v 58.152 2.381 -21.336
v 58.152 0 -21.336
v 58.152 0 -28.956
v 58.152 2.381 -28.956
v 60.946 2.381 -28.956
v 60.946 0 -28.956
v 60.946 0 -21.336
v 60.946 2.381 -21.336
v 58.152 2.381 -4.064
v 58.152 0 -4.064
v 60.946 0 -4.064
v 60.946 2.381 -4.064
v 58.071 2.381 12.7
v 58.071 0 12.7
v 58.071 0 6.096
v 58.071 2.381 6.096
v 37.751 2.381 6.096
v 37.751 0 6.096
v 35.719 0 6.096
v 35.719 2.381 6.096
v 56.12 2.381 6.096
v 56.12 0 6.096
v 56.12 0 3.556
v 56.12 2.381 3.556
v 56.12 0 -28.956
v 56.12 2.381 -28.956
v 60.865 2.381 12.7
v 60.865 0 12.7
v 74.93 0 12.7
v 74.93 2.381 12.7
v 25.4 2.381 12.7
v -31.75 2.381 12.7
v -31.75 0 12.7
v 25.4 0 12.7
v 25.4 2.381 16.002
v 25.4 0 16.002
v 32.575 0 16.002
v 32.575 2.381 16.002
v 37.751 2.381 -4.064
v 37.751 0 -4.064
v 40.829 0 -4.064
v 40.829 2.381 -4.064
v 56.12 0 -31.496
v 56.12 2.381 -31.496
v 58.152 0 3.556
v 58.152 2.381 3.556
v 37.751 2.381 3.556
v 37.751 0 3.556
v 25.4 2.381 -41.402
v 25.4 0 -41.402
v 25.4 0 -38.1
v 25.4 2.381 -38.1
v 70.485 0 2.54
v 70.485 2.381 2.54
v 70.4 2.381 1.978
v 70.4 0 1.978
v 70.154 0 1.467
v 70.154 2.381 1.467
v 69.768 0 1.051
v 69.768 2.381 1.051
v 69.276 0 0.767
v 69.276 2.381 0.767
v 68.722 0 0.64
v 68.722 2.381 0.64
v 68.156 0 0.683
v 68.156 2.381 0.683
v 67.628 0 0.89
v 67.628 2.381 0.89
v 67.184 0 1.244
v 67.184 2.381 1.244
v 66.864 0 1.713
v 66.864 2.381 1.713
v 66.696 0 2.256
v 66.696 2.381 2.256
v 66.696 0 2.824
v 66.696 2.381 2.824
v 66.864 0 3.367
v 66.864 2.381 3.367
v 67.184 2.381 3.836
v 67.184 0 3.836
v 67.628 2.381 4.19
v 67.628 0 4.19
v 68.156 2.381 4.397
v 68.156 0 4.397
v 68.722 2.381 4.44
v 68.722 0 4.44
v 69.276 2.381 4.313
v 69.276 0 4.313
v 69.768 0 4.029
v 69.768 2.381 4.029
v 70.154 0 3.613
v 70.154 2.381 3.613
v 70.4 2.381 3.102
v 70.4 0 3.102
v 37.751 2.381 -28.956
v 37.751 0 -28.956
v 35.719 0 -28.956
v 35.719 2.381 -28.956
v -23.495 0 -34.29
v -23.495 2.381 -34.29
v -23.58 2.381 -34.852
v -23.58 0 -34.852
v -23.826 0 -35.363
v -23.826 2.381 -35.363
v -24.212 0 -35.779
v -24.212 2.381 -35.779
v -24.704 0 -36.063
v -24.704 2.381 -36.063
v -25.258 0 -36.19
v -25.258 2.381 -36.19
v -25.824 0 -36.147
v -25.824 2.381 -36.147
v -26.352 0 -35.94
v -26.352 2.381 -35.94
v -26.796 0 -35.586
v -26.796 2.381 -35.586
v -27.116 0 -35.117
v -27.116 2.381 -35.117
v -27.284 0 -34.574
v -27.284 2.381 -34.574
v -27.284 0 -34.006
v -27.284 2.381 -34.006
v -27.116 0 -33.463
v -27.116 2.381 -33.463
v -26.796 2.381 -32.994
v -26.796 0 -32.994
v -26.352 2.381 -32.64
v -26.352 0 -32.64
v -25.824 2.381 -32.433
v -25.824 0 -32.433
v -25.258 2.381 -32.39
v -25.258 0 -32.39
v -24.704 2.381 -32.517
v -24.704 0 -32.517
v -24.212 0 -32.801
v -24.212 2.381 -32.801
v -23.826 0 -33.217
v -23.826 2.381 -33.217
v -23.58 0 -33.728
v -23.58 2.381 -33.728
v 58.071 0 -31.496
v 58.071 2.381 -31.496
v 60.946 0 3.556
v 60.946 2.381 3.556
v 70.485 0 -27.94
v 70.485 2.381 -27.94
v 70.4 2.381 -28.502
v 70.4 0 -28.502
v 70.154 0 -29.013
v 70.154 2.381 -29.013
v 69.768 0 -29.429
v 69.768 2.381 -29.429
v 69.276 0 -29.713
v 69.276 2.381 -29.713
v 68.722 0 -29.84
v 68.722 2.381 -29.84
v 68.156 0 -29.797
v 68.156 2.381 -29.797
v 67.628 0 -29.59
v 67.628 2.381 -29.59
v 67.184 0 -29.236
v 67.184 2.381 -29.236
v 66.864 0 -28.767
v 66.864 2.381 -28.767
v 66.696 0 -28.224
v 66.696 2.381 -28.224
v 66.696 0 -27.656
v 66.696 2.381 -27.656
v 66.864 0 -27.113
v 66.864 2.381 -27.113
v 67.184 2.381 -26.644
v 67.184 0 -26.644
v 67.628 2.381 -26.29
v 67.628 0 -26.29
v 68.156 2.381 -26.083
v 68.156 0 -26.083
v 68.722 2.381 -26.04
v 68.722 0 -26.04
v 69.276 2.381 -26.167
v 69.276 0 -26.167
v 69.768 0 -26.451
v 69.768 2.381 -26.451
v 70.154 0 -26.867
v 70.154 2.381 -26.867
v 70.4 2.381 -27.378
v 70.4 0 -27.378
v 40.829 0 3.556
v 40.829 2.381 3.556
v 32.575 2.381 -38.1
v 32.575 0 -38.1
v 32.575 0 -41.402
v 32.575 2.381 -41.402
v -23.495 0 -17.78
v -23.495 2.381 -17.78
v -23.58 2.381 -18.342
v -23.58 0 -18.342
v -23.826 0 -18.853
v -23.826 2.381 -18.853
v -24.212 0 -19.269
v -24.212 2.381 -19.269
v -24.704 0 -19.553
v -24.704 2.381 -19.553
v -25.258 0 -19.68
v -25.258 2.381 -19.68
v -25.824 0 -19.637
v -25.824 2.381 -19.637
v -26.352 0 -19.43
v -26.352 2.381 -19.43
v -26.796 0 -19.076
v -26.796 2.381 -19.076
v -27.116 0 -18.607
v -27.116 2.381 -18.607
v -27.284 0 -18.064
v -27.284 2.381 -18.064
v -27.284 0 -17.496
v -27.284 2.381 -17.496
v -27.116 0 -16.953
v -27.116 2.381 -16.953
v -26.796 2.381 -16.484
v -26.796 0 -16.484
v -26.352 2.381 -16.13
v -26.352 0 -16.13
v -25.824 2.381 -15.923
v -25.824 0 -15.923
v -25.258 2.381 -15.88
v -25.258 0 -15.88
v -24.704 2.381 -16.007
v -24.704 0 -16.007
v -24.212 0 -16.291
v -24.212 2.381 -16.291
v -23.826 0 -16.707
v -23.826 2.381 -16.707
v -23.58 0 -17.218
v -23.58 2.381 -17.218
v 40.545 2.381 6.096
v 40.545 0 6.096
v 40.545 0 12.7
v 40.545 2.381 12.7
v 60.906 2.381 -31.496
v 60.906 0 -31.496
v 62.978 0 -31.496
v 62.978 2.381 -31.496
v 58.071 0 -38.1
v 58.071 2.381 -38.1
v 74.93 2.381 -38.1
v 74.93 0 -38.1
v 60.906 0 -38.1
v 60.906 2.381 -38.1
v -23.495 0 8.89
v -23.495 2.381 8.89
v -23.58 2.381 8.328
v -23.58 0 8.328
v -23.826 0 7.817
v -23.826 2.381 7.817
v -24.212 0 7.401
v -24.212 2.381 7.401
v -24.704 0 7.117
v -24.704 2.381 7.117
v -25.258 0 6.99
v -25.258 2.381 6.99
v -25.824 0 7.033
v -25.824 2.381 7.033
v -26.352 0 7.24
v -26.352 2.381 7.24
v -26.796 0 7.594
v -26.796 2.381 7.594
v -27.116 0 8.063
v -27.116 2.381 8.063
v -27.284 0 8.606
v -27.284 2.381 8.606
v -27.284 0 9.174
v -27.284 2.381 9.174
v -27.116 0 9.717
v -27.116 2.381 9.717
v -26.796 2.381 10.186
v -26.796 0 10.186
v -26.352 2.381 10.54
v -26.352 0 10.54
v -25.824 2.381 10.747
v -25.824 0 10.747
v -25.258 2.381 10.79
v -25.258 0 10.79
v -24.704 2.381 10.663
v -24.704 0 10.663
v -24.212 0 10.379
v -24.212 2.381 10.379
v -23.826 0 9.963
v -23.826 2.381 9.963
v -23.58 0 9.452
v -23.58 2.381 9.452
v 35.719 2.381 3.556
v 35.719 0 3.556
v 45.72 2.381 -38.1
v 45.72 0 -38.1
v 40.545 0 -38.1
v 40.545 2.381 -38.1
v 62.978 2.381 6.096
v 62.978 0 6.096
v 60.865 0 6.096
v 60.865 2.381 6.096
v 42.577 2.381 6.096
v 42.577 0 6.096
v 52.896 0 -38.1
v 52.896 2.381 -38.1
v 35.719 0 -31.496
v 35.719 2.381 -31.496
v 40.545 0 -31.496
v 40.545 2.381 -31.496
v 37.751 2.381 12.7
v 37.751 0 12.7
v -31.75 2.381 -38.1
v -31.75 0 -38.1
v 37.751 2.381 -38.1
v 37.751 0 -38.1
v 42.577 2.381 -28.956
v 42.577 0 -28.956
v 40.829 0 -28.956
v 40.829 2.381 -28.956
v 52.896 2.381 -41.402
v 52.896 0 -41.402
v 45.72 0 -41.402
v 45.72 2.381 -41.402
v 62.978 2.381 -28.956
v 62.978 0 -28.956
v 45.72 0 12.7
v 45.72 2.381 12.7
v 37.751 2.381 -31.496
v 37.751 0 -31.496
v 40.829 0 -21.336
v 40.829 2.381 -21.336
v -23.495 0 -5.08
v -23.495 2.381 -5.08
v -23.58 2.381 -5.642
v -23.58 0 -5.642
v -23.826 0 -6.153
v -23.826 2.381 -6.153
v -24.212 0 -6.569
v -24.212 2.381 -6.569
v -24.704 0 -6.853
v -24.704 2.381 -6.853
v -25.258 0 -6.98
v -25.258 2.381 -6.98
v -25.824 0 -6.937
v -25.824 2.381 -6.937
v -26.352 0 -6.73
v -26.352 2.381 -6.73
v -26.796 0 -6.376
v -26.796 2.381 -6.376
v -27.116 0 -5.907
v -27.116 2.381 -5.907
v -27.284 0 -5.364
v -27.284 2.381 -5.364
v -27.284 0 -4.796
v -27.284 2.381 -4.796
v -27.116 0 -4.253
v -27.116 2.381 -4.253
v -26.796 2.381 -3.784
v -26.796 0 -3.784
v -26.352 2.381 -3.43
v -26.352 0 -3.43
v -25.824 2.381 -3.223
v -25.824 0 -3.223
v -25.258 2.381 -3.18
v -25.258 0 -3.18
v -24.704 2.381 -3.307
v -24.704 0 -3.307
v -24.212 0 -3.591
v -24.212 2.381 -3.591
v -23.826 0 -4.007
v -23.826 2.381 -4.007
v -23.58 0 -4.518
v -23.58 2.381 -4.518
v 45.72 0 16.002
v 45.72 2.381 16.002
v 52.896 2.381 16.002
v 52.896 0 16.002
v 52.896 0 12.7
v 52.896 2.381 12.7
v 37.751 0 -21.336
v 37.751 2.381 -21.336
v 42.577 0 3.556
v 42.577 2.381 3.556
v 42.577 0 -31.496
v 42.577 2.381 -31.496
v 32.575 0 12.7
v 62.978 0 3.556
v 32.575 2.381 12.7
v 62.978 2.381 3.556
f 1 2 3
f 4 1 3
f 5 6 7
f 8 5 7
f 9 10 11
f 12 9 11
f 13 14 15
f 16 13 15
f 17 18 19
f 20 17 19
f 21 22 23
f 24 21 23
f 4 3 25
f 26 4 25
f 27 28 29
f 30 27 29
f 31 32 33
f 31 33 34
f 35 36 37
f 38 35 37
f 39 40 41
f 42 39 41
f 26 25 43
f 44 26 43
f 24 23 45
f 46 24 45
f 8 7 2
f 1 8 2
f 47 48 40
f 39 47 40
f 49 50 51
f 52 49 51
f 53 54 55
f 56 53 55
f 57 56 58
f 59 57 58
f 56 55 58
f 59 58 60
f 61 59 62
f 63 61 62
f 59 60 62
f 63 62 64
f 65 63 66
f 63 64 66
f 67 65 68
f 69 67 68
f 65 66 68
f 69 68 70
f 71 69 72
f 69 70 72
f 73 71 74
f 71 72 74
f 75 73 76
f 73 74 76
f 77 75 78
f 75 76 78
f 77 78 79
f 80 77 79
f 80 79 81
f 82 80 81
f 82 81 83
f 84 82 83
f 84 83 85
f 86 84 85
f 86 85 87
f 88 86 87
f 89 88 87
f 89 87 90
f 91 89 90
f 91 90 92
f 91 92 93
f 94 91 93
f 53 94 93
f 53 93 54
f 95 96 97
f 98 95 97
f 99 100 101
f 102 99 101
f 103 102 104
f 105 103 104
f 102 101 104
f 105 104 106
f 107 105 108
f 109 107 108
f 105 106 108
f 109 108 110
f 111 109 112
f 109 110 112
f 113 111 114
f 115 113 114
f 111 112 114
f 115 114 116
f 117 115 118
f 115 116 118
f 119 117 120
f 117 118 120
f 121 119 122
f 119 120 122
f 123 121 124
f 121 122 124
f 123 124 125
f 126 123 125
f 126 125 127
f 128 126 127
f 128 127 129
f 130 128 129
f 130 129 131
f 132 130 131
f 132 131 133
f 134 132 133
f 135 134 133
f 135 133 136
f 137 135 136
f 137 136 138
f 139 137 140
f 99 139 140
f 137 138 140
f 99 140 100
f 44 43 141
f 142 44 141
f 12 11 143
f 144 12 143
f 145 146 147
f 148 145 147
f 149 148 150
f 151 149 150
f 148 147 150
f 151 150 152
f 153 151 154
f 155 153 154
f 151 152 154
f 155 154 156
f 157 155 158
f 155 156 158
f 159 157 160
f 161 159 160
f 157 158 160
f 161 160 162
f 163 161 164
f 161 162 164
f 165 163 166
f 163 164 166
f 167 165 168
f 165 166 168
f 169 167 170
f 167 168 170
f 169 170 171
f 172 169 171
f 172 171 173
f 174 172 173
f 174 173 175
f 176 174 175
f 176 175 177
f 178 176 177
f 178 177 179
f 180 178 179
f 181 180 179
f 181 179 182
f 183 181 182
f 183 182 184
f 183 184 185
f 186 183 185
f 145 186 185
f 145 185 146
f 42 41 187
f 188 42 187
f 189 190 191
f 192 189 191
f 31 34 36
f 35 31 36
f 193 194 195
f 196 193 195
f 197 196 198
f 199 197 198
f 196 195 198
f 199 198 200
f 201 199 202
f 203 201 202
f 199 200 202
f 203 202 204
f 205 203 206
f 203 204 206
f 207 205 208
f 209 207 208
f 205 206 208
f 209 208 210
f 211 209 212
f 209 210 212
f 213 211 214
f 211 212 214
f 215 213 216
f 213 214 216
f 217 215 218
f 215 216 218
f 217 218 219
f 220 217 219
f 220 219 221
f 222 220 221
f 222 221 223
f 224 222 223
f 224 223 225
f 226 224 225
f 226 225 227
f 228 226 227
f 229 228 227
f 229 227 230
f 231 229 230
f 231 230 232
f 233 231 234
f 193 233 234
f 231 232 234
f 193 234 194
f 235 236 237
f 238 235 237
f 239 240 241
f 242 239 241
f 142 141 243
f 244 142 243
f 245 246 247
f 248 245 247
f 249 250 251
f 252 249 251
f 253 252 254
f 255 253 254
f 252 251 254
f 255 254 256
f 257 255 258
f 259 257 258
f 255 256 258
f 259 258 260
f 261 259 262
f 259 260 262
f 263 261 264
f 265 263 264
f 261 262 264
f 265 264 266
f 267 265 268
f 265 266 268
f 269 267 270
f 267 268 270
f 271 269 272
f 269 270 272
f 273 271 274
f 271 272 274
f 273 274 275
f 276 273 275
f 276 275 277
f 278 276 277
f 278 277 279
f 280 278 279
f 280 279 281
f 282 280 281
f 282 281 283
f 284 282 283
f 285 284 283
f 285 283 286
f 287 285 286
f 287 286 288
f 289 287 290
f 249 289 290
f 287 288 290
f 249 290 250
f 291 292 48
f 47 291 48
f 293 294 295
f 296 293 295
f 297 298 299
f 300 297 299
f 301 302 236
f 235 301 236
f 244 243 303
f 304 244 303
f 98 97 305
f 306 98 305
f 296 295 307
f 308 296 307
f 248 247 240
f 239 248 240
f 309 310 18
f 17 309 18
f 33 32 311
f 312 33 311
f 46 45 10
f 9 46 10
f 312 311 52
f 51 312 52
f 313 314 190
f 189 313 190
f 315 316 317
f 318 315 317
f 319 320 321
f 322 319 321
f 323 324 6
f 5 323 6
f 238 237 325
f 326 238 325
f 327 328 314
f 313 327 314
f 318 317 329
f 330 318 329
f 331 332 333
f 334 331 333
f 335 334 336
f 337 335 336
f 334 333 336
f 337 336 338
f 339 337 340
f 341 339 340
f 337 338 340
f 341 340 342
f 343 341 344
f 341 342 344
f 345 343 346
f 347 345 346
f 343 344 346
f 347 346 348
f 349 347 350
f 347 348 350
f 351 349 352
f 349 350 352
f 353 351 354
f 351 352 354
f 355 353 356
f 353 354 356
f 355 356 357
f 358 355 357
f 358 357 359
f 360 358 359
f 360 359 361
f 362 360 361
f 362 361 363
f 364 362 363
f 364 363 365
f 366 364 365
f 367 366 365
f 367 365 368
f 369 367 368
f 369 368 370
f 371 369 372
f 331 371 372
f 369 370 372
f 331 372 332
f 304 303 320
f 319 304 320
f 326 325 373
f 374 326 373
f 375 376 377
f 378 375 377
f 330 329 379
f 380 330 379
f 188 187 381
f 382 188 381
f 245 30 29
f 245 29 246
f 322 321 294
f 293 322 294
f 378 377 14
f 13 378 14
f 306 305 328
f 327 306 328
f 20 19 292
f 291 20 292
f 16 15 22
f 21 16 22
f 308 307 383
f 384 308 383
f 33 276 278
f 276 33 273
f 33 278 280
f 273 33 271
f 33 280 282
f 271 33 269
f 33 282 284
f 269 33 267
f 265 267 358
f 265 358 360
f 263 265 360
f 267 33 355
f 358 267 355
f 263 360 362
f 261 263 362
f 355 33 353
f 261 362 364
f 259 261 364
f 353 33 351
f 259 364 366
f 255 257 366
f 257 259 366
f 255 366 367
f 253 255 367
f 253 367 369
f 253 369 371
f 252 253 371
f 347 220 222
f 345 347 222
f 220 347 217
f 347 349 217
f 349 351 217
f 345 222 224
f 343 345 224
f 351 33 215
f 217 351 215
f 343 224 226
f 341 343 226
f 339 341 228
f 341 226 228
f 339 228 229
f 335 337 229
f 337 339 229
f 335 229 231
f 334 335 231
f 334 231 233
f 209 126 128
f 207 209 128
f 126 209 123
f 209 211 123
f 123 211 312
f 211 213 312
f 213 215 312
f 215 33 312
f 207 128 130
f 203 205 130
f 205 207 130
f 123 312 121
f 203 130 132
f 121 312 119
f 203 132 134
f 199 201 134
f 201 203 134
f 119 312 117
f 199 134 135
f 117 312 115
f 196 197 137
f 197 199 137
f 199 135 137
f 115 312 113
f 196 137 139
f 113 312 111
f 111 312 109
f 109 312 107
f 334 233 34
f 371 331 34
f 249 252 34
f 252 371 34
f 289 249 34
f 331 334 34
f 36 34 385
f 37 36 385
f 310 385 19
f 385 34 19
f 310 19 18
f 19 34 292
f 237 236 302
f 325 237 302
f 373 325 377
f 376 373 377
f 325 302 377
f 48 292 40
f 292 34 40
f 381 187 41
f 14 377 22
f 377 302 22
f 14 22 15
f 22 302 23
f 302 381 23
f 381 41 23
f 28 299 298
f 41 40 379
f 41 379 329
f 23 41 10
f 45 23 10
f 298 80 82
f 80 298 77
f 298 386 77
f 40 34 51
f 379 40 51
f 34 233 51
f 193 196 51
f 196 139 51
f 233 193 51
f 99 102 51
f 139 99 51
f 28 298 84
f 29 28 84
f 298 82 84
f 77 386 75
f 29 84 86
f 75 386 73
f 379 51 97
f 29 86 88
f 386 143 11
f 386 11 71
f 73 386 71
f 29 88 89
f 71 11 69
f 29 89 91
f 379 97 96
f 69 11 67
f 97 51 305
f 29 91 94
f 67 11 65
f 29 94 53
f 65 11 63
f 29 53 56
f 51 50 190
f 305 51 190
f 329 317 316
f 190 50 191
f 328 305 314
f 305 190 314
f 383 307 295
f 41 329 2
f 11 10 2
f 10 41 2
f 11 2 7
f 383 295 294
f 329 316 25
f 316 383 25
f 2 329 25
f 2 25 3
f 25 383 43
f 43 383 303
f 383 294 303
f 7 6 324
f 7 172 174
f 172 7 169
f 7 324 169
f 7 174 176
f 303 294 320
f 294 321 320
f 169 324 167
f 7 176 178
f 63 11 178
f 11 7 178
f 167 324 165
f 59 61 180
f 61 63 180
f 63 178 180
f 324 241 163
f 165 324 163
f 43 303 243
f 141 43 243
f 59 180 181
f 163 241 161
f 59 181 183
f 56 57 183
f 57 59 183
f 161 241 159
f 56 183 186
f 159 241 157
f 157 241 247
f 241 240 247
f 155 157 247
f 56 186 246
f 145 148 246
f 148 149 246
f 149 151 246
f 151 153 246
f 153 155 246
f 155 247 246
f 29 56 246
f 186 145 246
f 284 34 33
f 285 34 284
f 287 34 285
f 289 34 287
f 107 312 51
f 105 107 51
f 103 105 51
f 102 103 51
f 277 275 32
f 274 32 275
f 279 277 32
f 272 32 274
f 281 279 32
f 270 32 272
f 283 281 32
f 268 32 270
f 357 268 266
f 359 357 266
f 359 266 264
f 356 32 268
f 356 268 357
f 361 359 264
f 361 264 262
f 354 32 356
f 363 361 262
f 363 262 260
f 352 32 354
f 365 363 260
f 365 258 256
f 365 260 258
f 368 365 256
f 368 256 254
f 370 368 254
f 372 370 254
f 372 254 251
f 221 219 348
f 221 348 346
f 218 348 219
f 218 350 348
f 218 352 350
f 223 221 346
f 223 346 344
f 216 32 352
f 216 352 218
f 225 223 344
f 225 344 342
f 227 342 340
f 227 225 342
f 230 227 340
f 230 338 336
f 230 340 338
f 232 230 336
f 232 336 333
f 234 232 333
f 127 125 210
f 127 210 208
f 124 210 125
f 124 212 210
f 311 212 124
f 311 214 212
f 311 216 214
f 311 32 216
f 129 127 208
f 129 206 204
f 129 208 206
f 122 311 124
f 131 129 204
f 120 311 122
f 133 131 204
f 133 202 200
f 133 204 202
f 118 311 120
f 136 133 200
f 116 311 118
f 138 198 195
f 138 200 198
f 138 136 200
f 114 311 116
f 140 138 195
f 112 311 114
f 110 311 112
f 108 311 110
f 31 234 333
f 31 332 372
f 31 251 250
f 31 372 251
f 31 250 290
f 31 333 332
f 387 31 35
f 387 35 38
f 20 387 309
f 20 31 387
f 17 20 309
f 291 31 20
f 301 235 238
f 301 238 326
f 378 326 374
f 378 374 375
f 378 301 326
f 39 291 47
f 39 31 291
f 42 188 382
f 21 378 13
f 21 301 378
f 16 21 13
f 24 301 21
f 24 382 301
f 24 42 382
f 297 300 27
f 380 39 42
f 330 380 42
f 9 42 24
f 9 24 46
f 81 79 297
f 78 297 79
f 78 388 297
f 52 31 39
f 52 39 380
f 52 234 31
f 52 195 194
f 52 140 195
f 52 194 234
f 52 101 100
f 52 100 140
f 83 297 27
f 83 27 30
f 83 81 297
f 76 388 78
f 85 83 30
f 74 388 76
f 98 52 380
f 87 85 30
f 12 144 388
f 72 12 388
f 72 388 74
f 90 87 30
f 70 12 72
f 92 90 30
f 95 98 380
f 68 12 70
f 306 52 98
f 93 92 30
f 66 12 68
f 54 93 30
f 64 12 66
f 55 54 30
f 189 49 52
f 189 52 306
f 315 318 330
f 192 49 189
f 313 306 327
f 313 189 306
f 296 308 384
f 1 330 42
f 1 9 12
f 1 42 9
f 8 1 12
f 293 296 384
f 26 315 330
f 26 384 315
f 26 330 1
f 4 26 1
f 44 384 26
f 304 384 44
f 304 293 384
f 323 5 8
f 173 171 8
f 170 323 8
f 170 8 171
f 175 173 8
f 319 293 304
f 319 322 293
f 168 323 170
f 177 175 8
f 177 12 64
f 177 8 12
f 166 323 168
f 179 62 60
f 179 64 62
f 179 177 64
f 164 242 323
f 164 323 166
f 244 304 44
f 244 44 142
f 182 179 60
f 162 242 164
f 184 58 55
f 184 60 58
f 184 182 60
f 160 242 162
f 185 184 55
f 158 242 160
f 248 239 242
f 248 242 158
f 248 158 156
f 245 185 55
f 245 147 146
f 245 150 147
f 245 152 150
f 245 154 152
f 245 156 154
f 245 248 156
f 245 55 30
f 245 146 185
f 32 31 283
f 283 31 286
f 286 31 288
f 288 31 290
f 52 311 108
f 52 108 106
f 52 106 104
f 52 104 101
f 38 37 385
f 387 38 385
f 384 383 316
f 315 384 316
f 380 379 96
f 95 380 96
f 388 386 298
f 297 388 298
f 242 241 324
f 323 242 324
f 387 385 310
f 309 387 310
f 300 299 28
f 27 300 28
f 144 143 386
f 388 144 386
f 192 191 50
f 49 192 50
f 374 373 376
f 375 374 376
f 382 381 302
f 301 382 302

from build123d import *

# Parameters (mm, degrees)
BOSS_EXTRUDE1_DEPTH = 2.38125
SKETCH3_W           = 38.1
SKETCH3_H           = 50.8
SKETCH3_R           = 1.905
BOSS_EXTRUDE4_DEPTH = 2.38125
SKETCH7_W           = 33.02
SKETCH7_H           = 50.8
CUT_EXTRUDE3_DEPTH  = 3.38125
SKETCH8_R           = 1.905
CUT_EXTRUDE4_DEPTH  = 3.38125


with BuildPart() as part:
    # Sketch1 → Boss-Extrude1 (new body)
    with BuildSketch(Plane(origin=(0, 0, 0), x_dir=(1, 0, 0), z_dir=(0, 1, 0))):
        Polygon((107.95, -12.7), (107.95, 0), (107.95, 38.1), (60.905597294, 38.1), (60.905597294, 31.496), (62.977716984, 31.496), (62.977716984, 28.956), (60.945716984, 28.956), (60.945716984, 21.336), (58.151716984, 21.336), (58.151716984, 28.956), (56.119716984, 28.956), (56.119716984, 31.496), (58.07075, 31.496), (58.07075, 38.1), (52.8955, 38.1), (52.8955, 41.402), (45.72, 41.402), (45.72, 38.1), (40.54475, 38.1), (40.54475, 31.496), (42.57675, 31.496), (42.57675, 28.956), (40.82869895, 28.956), (40.82869895, 21.336), (37.75075, 21.336), (37.75075, 28.956), (35.71875, 28.956), (35.71875, 31.496), (37.75075, 31.496), (37.75075, 38.1), (32.5755, 38.1), (32.5755, 41.402), (25.4, 41.402), (25.4, 38.1), (6.35, 38.1), (6.35, -12.7), (25.4, -12.7), (25.4, -16.002), (32.5755, -16.002), (32.5755, -12.7), (37.75075, -12.7), (37.75075, -6.096), (35.71875, -6.096), (35.71875, -3.556), (37.75075, -3.556), (37.75075, 4.064), (40.82869895, 4.064), (40.82869895, -3.556), (42.57675, -3.556), (42.57675, -6.096), (40.54475, -6.096), (40.54475, -12.7), (45.72, -12.7), (45.72, -16.002), (52.8955, -16.002), (52.8955, -12.7), (58.07075, -12.7), (58.07075, -6.096), (56.119716984, -6.096), (56.119716984, -3.556), (58.151716984, -3.556), (58.151716984, 4.064), (60.945716984, 4.064), (60.945716984, -3.556), (62.977716984, -3.556), (62.977716984, -6.096), (60.86475, -6.096), (60.86475, -12.7), (66.04, -12.7), (73.2155, -12.7), (78.035770588, -12.7), (80.829770588, -12.7), align=None)
    extrude(amount=BOSS_EXTRUDE1_DEPTH)

    # Sketch3 → Boss-Extrude4 (add)
    with BuildSketch(Plane(origin=(0, 2.38125, 0), x_dir=(1, 0, 0), z_dir=(0, 1, 0))):
        with Locations((-12.7, 12.7)):
            Rectangle(SKETCH3_W, SKETCH3_H)
        with Locations((-25.4, -8.89)):
            Circle(SKETCH3_R, mode=Mode.SUBTRACT)
        with Locations((-25.4, 5.08)):
            Circle(SKETCH3_R, mode=Mode.SUBTRACT)
        with Locations((-25.4, 17.78)):
            Circle(SKETCH3_R, mode=Mode.SUBTRACT)
        with Locations((-25.4, 34.29)):
            Circle(SKETCH3_R, mode=Mode.SUBTRACT)
    extrude(amount=-BOSS_EXTRUDE4_DEPTH)

    # Sketch7 → Cut-Extrude3 (cut, through all)
    with BuildSketch(Plane(origin=(0, 2.38125, 0), x_dir=(1, 0, 0), z_dir=(0, 1, 0))):
        with Locations((91.44, 12.7)):
            Rectangle(SKETCH7_W, SKETCH7_H)
    extrude(amount=-CUT_EXTRUDE3_DEPTH, mode=Mode.SUBTRACT)

    # Sketch8 → Cut-Extrude4 (cut, through all)
    with BuildSketch(Plane(origin=(0, 2.38125, 0), x_dir=(1, 0, 0), z_dir=(0, 1, 0))):
        with Locations((68.58, -2.54)):
            Circle(SKETCH8_R)
        with Locations((68.58, 27.94)):
            Circle(SKETCH8_R)
    extrude(amount=-CUT_EXTRUDE4_DEPTH, mode=Mode.SUBTRACT)


solid = part.part
